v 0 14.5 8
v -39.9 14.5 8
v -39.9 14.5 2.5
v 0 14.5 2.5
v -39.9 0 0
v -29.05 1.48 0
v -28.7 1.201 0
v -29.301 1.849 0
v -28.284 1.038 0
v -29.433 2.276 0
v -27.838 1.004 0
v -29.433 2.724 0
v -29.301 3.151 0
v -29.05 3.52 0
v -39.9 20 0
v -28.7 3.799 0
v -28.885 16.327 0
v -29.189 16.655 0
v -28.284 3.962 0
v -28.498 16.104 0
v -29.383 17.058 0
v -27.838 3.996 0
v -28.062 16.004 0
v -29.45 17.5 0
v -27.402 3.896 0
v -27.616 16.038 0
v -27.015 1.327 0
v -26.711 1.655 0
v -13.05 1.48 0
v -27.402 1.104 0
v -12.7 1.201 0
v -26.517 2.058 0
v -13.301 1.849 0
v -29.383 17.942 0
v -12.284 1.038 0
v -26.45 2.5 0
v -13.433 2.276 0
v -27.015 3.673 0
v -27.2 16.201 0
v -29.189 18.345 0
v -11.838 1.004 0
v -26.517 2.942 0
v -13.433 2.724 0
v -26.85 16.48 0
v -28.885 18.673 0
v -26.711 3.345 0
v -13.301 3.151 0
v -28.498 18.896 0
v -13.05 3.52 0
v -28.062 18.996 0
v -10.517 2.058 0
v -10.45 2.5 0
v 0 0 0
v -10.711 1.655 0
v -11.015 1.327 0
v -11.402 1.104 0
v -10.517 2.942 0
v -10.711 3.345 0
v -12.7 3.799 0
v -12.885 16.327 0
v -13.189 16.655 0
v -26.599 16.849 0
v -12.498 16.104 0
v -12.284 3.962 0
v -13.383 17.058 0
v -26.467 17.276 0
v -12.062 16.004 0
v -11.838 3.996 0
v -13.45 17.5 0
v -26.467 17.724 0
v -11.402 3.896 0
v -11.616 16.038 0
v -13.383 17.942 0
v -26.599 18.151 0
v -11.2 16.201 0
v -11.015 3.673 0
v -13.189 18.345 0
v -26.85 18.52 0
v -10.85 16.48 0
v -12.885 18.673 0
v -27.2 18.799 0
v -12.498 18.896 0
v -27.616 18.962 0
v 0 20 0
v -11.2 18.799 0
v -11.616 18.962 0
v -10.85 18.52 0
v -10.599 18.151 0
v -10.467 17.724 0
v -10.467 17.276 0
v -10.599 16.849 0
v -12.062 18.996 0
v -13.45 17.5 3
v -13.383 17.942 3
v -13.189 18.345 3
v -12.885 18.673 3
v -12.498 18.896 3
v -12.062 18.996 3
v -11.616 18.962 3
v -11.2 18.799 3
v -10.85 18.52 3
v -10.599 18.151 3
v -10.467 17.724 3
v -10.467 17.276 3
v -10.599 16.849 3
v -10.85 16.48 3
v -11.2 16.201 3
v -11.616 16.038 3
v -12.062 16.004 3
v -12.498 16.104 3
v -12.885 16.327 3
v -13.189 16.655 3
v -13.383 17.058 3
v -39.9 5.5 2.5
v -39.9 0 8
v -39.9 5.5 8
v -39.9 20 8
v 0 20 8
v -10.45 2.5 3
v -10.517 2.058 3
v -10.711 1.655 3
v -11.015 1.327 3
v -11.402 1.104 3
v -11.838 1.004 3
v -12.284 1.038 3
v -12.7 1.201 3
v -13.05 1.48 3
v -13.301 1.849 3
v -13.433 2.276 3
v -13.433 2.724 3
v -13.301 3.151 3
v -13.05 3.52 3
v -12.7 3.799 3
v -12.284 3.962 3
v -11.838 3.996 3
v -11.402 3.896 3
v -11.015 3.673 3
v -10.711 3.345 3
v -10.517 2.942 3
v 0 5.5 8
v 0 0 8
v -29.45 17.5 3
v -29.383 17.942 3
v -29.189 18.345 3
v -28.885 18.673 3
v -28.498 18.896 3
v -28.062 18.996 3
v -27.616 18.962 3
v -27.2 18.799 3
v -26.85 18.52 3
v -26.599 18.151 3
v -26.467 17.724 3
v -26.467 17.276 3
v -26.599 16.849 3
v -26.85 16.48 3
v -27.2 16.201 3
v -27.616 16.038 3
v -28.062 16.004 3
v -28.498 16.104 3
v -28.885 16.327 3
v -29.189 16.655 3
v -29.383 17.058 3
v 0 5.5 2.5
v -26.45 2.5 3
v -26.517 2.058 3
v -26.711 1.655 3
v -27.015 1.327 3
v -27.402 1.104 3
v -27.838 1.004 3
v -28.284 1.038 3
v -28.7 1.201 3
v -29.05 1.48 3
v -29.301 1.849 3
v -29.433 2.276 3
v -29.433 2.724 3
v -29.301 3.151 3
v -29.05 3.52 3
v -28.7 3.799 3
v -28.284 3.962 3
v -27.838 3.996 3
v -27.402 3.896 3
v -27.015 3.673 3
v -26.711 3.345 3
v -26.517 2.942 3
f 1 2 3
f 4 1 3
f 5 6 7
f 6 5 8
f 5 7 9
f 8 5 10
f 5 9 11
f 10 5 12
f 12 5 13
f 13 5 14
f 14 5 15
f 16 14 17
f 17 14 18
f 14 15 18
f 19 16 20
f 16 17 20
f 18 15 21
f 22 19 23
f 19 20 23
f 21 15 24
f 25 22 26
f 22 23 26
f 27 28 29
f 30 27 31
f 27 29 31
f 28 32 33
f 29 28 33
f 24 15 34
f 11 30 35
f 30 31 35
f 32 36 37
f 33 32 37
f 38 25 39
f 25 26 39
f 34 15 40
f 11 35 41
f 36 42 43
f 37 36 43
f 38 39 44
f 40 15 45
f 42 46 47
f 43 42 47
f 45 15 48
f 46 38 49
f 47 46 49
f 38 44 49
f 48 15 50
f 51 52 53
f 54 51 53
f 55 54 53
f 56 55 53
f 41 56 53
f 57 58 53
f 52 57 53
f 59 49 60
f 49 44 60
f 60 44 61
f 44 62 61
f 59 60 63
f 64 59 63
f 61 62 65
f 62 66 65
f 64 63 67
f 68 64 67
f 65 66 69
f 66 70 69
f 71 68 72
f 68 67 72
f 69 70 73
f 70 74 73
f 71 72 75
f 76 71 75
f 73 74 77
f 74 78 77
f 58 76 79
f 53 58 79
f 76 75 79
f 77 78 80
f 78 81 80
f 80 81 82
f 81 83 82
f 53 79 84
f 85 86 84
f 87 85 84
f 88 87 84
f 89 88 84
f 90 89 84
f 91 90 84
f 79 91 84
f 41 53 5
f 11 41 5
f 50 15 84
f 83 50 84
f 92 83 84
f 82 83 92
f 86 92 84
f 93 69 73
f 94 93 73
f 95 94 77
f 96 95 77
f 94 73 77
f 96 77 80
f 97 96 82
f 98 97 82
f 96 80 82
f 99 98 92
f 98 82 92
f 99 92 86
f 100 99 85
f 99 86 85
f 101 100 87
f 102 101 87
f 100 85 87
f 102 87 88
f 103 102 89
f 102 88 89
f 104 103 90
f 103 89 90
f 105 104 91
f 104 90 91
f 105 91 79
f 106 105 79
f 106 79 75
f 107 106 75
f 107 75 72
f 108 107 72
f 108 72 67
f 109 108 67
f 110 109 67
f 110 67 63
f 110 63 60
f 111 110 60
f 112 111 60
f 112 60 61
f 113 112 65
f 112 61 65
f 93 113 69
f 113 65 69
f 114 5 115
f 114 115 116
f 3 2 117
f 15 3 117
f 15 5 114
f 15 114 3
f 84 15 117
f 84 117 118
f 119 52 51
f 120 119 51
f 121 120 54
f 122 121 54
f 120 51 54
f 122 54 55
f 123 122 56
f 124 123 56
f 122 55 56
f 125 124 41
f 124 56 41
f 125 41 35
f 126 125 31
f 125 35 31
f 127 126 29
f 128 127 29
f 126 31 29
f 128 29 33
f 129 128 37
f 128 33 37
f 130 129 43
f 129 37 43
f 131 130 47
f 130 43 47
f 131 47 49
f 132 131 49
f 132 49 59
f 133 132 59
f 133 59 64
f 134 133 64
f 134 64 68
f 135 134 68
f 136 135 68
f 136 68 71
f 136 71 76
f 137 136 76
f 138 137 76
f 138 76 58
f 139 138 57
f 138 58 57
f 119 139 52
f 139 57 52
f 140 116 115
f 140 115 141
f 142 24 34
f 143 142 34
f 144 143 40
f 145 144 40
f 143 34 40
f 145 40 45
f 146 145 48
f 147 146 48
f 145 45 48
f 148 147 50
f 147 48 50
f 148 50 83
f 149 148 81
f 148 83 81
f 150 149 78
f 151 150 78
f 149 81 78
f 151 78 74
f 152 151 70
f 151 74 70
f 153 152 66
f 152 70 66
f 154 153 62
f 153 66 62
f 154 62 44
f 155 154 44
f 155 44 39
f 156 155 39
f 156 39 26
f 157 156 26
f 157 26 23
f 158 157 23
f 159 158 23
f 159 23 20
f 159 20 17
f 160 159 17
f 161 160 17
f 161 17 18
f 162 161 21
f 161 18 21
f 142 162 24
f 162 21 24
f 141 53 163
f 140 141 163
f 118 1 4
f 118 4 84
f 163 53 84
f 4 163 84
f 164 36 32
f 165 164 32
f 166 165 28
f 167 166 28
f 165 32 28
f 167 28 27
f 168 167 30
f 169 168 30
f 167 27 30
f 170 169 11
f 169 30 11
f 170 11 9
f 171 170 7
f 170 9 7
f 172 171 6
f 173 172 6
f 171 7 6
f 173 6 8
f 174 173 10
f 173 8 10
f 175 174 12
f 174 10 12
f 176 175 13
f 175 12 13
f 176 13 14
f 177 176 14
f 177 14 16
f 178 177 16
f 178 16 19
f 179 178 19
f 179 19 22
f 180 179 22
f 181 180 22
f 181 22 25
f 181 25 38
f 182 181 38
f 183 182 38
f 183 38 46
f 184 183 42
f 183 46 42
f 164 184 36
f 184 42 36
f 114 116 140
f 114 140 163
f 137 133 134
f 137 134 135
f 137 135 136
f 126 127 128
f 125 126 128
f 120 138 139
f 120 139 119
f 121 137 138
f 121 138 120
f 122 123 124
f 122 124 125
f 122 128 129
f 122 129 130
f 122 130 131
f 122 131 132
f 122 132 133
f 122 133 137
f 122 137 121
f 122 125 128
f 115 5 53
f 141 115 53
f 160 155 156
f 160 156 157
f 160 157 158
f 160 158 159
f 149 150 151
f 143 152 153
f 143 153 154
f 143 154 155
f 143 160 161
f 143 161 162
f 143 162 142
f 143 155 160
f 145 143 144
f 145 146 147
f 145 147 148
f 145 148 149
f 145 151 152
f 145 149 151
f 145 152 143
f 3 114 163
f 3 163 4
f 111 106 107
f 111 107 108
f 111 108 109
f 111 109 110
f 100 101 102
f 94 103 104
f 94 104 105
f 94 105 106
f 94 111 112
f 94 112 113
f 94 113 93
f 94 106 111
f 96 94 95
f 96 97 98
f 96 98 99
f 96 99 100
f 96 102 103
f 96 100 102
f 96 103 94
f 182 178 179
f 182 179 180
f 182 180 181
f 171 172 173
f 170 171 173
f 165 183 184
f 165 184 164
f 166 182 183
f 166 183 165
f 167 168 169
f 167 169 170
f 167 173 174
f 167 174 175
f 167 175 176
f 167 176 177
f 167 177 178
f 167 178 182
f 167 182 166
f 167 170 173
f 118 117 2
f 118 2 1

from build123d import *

# Parameters (mm, degrees)
SKETCH_1_W          = 39.9
SKETCH_1_H          = 20
EXTRUDE_1_DEPTH     = 8
SKETCH_2_R          = 1.5
CUT_EXTRUDE_1_DEPTH = 3
SKETCH_3_W          = 5.5
SKETCH_3_H          = 9
CUT_EXTRUDE_2_DEPTH = 46.343246465


with BuildPart() as part:
    # 草图1 → 凸台-拉伸1 (new body)
    with BuildSketch(Plane.XY):
        with Locations((-19.95, 10)):
            Rectangle(SKETCH_1_W, SKETCH_1_H)
    extrude(amount=EXTRUDE_1_DEPTH)

    # 草图2 → 切除-拉伸1 (cut)
    with BuildSketch(Plane(origin=(0, 0, 0), x_dir=(-1, 0, 0), z_dir=(0, 0, -1))):
        with Locations((11.95, 17.5)):
            Circle(SKETCH_2_R)
        with Locations((27.95, 17.5)):
            Circle(SKETCH_2_R)
        with Locations(Location((27.95, 2.5, 0), (0, 0, 180))):
            Circle(SKETCH_2_R)
        with Locations(Location((11.95, 2.5, 0), (0, 0, 180))):
            Circle(SKETCH_2_R)
    extrude(amount=-CUT_EXTRUDE_1_DEPTH, mode=Mode.SUBTRACT)

    # 草图3 → 切除-拉伸2 (cut, through all)
    with BuildSketch(Plane(origin=(0, 0, 0), x_dir=(0, 0, -1), z_dir=(1, 0, 0))):
        with Locations((-5.25, 10)):
            Rectangle(SKETCH_3_W, SKETCH_3_H)
    extrude(amount=-CUT_EXTRUDE_2_DEPTH, mode=Mode.SUBTRACT)


solid = part.part
